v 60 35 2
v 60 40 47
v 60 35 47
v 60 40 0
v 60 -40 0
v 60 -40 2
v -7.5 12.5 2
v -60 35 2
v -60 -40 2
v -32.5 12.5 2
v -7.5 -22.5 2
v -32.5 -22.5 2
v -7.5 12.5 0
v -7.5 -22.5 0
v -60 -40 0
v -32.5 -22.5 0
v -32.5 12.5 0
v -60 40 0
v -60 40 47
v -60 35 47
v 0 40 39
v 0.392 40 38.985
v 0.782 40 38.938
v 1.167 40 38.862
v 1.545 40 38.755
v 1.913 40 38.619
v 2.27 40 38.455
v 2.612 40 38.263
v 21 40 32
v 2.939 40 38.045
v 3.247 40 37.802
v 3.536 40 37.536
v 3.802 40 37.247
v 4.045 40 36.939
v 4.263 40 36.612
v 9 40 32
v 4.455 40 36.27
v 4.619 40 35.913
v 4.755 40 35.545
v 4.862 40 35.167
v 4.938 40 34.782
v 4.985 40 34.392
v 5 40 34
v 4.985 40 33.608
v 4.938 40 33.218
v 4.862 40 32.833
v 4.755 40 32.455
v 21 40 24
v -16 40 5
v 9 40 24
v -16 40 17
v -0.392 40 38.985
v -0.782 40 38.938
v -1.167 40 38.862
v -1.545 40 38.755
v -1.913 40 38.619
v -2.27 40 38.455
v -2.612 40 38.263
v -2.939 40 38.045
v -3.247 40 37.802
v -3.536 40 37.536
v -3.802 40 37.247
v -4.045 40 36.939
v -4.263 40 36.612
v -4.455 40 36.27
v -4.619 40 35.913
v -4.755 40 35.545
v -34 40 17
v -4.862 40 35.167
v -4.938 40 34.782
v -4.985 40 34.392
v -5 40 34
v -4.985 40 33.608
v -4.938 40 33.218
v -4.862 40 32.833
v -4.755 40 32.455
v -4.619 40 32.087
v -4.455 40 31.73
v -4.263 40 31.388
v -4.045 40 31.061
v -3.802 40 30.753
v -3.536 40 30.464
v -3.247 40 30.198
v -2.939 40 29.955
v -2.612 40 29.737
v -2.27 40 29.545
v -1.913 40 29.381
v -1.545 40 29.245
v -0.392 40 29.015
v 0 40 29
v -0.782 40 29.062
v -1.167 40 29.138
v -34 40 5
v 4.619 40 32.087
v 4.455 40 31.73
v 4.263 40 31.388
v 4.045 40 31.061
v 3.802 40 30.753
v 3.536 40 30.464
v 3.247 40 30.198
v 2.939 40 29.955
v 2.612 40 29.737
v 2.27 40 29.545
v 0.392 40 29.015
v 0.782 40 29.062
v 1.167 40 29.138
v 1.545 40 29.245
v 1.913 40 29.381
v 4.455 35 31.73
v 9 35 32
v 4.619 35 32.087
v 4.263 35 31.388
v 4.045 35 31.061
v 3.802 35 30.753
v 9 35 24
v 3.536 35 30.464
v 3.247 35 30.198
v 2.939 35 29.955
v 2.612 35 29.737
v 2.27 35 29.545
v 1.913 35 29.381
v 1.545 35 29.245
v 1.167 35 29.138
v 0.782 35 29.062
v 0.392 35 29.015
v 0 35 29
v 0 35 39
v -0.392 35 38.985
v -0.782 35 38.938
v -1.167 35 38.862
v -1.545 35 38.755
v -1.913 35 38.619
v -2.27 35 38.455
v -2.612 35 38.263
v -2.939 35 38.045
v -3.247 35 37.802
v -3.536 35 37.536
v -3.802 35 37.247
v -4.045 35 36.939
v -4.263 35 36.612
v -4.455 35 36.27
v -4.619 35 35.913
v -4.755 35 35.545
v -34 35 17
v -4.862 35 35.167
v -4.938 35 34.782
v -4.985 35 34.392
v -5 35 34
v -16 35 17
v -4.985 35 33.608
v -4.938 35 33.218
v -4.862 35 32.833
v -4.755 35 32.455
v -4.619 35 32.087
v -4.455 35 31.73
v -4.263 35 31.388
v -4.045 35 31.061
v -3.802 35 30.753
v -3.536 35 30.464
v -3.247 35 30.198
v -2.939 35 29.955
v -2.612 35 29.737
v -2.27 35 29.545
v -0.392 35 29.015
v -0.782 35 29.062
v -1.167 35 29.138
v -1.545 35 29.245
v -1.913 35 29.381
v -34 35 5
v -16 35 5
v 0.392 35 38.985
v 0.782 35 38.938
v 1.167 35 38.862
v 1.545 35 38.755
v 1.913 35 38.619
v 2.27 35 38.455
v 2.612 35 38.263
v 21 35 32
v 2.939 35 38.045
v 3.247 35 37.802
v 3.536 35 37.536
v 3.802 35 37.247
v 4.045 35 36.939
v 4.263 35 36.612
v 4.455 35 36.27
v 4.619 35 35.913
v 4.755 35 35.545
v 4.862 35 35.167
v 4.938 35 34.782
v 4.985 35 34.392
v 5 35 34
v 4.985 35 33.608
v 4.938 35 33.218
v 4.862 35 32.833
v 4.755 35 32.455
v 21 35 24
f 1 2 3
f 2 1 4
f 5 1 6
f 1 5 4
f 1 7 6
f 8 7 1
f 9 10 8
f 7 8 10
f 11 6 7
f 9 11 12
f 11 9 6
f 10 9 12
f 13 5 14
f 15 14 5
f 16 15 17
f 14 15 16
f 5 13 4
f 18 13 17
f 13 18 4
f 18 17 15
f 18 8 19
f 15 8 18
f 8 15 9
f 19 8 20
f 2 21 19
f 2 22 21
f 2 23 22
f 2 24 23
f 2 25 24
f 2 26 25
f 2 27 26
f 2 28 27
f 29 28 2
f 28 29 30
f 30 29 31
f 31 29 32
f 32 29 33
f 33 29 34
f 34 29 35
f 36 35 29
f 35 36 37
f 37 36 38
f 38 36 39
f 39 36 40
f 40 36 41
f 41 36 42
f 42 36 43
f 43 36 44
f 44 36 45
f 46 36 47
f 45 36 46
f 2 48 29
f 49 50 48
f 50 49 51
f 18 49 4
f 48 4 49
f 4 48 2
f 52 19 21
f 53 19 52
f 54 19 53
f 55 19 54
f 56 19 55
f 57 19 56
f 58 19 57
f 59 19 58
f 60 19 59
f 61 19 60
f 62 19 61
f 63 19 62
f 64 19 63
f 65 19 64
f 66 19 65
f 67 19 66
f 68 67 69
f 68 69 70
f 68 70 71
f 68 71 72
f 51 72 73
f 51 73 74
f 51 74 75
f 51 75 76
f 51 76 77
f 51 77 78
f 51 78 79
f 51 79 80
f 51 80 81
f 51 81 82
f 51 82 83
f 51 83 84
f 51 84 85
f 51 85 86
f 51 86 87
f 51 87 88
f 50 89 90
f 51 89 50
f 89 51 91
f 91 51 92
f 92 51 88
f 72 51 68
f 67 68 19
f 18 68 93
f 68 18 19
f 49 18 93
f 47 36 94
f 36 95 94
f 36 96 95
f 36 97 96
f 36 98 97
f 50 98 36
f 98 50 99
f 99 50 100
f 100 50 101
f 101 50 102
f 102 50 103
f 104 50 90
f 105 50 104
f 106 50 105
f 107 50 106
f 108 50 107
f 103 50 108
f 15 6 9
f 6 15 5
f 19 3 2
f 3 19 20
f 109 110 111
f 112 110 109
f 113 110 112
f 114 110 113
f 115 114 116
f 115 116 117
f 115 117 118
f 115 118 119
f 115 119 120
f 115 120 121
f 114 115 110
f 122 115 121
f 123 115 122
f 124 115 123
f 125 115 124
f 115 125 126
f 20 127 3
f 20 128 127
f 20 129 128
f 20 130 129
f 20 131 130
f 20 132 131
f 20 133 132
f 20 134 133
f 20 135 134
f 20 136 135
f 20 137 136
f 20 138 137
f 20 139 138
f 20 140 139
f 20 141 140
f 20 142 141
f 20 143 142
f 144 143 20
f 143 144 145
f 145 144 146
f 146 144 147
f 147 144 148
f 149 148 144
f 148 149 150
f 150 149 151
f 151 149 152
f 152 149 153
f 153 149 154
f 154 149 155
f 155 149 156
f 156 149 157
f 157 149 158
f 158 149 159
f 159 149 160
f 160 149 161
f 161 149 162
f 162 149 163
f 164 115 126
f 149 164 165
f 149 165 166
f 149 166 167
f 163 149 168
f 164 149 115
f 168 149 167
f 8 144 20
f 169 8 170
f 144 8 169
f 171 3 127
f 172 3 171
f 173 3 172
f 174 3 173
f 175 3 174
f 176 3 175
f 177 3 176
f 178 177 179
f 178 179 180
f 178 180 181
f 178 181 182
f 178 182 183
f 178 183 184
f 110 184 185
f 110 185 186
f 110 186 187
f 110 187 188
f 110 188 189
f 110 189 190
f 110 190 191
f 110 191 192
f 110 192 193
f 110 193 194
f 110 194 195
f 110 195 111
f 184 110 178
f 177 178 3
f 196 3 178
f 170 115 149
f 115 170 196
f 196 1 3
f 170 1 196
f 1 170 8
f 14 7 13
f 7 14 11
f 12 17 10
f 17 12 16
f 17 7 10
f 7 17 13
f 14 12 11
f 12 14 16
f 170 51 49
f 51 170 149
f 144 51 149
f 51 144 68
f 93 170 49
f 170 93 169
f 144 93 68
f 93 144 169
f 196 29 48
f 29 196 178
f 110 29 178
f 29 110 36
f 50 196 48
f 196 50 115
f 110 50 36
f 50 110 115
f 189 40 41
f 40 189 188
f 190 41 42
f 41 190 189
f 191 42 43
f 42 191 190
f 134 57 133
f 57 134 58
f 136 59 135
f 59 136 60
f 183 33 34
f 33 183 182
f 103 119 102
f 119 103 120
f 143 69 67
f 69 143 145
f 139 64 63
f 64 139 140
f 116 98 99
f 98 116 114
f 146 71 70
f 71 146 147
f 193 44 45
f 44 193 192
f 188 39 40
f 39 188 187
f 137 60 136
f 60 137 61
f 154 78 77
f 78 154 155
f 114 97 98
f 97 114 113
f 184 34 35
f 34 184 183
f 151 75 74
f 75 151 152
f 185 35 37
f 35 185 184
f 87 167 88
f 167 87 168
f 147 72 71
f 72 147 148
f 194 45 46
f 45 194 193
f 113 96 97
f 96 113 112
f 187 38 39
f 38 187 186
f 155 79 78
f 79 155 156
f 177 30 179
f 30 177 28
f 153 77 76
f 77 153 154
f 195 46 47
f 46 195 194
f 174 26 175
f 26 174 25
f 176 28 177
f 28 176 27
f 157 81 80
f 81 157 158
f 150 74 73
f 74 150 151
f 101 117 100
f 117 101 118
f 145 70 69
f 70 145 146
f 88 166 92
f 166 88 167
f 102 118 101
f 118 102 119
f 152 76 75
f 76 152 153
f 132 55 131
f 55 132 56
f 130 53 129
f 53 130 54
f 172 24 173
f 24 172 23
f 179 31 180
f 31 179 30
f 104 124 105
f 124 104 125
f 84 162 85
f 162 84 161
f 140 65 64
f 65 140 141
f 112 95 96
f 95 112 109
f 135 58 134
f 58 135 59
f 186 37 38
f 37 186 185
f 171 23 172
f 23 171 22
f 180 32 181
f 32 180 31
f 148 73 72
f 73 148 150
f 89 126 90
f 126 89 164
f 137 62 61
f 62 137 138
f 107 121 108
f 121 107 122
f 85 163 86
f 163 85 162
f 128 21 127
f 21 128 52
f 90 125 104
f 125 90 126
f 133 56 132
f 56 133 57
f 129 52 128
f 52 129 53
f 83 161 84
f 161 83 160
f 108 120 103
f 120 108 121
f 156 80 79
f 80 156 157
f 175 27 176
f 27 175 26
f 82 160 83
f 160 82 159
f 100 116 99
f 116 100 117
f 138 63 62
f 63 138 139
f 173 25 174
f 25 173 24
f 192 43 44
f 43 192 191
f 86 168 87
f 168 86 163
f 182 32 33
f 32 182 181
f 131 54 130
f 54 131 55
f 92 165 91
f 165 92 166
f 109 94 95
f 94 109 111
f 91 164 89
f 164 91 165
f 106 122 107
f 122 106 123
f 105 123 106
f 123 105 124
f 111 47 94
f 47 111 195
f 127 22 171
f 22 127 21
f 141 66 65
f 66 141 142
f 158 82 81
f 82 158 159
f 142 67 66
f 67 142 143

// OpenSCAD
// ==========================================
// PARAMETRIC DIMENSIONS
// ==========================================
// Base sheet geometry
plate_width = 120;
plate_depth = 80;
plate_thickness = 2;

// Upright wall geometry (spans full width along back edge)
wall_thickness = 5;
wall_height = 45;

// Floor plate rectangular void (through-cut)
floor_void_width = 25;
floor_void_depth = 35;
floor_void_x = -20;
floor_void_y = -5;

// Wall void 1 (lower rectangular opening)
wall_void1_width = 18;
wall_void1_height = 12;
wall_void1_z_offset = 3;
wall_void1_x = -25;

// Wall void 2 (higher rectangular opening)
wall_void2_width = 12;
wall_void2_height = 8;
wall_void2_z_offset = 22;
wall_void2_x = 15;

// Wall round through-hole
wall_hole_diameter = 10;
wall_hole_x = 0;
wall_hole_z = 32;

// Global mesh resolution for curved surfaces
$fn = 80;

// ==========================================
// REUSABLE MODULES
// ==========================================
module base_sheet() {
    translate([0, 0, plate_thickness / 2])
        cube([plate_width, plate_depth, plate_thickness], center = true);
}

module upright_wall() {
    translate([0, plate_depth / 2 - wall_thickness / 2, plate_thickness + wall_height / 2])
        cube([plate_width, wall_thickness, wall_height], center = true);
}

module floor_void() {
    translate([floor_void_x, floor_void_y, plate_thickness / 2])
        cube([floor_void_width, floor_void_depth, plate_thickness + 1], center = true);
}

module wall_void_1() {
    translate([wall_void1_x, plate_depth / 2 - wall_thickness / 2, plate_thickness + wall_void1_z_offset + wall_void1_height / 2])
        cube([wall_void1_width, wall_thickness + 1, wall_void1_height], center = true);
}

module wall_void_2() {
    translate([wall_void2_x, plate_depth / 2 - wall_thickness / 2, plate_thickness + wall_void2_z_offset + wall_void2_height / 2])
        cube([wall_void2_width, wall_thickness + 1, wall_void2_height], center = true);
}

module wall_hole() {
    translate([wall_hole_x, plate_depth / 2 - wall_thickness / 2, plate_thickness + wall_hole_z])
        rotate([90, 0, 0])
            cylinder(h = wall_thickness + 1, d = wall_hole_diameter, center = true);
}

// ==========================================
// MAIN MODEL ASSEMBLY
// ==========================================
difference() {
    union() {
        base_sheet();
        upright_wall();
    }
    floor_void();
    wall_void_1();
    wall_void_2();
    wall_hole();
}
